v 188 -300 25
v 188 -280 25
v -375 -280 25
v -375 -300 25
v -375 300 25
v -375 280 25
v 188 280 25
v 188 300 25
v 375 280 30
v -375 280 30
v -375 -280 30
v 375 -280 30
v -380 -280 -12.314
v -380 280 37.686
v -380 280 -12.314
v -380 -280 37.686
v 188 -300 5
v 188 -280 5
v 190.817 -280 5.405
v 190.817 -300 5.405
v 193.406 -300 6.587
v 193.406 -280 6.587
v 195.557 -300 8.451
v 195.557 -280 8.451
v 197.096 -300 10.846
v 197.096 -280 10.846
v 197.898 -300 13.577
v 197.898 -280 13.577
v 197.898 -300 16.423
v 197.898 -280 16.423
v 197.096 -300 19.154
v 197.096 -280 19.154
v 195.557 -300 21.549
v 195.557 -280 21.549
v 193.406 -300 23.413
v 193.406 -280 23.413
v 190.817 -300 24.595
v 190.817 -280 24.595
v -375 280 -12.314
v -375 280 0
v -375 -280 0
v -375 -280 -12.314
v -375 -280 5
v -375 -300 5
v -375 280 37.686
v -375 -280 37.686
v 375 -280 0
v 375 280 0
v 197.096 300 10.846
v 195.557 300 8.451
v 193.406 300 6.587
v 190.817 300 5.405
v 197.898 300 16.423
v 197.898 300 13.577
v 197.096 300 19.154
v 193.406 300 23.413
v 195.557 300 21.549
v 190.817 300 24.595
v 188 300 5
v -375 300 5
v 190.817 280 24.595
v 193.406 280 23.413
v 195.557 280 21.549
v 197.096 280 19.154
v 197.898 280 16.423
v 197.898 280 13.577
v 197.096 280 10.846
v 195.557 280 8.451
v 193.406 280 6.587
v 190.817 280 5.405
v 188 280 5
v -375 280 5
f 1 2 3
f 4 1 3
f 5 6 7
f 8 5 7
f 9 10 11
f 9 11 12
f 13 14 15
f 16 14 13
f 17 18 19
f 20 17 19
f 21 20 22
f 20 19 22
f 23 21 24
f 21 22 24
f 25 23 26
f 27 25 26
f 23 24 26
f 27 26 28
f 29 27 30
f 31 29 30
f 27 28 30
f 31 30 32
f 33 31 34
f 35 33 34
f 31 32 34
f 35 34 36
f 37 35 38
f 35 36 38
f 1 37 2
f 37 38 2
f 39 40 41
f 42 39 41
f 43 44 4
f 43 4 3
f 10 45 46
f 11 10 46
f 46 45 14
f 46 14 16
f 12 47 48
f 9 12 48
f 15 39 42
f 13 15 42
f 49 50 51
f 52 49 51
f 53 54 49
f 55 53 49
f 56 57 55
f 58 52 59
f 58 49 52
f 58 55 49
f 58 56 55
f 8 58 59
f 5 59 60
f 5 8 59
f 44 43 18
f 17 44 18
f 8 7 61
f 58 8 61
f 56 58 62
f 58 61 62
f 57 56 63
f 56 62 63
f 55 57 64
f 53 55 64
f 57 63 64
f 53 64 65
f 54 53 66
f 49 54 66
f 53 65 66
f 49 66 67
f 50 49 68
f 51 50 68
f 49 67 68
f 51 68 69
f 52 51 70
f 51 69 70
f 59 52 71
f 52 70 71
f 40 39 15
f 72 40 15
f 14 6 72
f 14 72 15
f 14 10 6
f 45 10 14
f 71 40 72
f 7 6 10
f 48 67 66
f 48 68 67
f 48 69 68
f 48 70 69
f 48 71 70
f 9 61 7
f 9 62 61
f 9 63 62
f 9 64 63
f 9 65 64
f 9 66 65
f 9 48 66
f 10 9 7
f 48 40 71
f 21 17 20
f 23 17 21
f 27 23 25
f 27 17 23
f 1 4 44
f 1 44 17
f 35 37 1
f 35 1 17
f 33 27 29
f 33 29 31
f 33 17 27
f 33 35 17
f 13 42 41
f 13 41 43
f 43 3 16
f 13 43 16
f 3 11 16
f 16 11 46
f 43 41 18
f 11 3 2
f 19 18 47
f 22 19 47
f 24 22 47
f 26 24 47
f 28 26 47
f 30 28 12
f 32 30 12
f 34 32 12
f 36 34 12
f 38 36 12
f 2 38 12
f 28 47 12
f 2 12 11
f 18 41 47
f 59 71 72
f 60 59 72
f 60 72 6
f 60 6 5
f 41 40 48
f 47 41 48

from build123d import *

# Parameters (mm, degrees)
F0_W     = 750
F0_H     = 560
F1_DEPTH = 30
F4_DEPTH = 20
F5_DEPTH = 20
F6_W     = 560
F6_H     = 50
F7_DEPTH = 5


with BuildPart() as f1:
    # F0 (on Top) → F1 (new body)
    with BuildSketch(Plane.XY):
        Rectangle(F0_W, F0_H)
    extrude(amount=F1_DEPTH)

    # F3 (on face) → F4 (join)
    with BuildSketch(Plane(origin=(0, 280, 0), x_dir=(-1, 0, 0), z_dir=(0, 1, 0))):
        with BuildLine():
            Line((-188, 5), (375, 5))
            Line((375, 5), (375, 25))
            Line((375, 25), (-188, 25))
            ThreePointArc((-188, 25), (-198, 15), (-188, 5))
        make_face()
    extrude(amount=F4_DEPTH)

    # F2 (on face) → F5 (join)
    with BuildSketch(Plane.XZ.offset(280)):
        with BuildLine():
            Line((-375, 25), (-375, 5))
            Line((-375, 5), (188, 5))
            ThreePointArc((188, 5), (198, 15), (188, 25))
            Line((188, 25), (-375, 25))
        make_face()
    extrude(amount=F5_DEPTH)

    # F6 (on face) → F7 (join)
    with BuildSketch(Plane(origin=(-375, 0, 0), x_dir=(0, -1, 0), z_dir=(-1, 0, 0))):
        with Locations((0, 12.686171)):
            Rectangle(F6_W, F6_H)
    extrude(amount=F7_DEPTH)


solid = f1.part
